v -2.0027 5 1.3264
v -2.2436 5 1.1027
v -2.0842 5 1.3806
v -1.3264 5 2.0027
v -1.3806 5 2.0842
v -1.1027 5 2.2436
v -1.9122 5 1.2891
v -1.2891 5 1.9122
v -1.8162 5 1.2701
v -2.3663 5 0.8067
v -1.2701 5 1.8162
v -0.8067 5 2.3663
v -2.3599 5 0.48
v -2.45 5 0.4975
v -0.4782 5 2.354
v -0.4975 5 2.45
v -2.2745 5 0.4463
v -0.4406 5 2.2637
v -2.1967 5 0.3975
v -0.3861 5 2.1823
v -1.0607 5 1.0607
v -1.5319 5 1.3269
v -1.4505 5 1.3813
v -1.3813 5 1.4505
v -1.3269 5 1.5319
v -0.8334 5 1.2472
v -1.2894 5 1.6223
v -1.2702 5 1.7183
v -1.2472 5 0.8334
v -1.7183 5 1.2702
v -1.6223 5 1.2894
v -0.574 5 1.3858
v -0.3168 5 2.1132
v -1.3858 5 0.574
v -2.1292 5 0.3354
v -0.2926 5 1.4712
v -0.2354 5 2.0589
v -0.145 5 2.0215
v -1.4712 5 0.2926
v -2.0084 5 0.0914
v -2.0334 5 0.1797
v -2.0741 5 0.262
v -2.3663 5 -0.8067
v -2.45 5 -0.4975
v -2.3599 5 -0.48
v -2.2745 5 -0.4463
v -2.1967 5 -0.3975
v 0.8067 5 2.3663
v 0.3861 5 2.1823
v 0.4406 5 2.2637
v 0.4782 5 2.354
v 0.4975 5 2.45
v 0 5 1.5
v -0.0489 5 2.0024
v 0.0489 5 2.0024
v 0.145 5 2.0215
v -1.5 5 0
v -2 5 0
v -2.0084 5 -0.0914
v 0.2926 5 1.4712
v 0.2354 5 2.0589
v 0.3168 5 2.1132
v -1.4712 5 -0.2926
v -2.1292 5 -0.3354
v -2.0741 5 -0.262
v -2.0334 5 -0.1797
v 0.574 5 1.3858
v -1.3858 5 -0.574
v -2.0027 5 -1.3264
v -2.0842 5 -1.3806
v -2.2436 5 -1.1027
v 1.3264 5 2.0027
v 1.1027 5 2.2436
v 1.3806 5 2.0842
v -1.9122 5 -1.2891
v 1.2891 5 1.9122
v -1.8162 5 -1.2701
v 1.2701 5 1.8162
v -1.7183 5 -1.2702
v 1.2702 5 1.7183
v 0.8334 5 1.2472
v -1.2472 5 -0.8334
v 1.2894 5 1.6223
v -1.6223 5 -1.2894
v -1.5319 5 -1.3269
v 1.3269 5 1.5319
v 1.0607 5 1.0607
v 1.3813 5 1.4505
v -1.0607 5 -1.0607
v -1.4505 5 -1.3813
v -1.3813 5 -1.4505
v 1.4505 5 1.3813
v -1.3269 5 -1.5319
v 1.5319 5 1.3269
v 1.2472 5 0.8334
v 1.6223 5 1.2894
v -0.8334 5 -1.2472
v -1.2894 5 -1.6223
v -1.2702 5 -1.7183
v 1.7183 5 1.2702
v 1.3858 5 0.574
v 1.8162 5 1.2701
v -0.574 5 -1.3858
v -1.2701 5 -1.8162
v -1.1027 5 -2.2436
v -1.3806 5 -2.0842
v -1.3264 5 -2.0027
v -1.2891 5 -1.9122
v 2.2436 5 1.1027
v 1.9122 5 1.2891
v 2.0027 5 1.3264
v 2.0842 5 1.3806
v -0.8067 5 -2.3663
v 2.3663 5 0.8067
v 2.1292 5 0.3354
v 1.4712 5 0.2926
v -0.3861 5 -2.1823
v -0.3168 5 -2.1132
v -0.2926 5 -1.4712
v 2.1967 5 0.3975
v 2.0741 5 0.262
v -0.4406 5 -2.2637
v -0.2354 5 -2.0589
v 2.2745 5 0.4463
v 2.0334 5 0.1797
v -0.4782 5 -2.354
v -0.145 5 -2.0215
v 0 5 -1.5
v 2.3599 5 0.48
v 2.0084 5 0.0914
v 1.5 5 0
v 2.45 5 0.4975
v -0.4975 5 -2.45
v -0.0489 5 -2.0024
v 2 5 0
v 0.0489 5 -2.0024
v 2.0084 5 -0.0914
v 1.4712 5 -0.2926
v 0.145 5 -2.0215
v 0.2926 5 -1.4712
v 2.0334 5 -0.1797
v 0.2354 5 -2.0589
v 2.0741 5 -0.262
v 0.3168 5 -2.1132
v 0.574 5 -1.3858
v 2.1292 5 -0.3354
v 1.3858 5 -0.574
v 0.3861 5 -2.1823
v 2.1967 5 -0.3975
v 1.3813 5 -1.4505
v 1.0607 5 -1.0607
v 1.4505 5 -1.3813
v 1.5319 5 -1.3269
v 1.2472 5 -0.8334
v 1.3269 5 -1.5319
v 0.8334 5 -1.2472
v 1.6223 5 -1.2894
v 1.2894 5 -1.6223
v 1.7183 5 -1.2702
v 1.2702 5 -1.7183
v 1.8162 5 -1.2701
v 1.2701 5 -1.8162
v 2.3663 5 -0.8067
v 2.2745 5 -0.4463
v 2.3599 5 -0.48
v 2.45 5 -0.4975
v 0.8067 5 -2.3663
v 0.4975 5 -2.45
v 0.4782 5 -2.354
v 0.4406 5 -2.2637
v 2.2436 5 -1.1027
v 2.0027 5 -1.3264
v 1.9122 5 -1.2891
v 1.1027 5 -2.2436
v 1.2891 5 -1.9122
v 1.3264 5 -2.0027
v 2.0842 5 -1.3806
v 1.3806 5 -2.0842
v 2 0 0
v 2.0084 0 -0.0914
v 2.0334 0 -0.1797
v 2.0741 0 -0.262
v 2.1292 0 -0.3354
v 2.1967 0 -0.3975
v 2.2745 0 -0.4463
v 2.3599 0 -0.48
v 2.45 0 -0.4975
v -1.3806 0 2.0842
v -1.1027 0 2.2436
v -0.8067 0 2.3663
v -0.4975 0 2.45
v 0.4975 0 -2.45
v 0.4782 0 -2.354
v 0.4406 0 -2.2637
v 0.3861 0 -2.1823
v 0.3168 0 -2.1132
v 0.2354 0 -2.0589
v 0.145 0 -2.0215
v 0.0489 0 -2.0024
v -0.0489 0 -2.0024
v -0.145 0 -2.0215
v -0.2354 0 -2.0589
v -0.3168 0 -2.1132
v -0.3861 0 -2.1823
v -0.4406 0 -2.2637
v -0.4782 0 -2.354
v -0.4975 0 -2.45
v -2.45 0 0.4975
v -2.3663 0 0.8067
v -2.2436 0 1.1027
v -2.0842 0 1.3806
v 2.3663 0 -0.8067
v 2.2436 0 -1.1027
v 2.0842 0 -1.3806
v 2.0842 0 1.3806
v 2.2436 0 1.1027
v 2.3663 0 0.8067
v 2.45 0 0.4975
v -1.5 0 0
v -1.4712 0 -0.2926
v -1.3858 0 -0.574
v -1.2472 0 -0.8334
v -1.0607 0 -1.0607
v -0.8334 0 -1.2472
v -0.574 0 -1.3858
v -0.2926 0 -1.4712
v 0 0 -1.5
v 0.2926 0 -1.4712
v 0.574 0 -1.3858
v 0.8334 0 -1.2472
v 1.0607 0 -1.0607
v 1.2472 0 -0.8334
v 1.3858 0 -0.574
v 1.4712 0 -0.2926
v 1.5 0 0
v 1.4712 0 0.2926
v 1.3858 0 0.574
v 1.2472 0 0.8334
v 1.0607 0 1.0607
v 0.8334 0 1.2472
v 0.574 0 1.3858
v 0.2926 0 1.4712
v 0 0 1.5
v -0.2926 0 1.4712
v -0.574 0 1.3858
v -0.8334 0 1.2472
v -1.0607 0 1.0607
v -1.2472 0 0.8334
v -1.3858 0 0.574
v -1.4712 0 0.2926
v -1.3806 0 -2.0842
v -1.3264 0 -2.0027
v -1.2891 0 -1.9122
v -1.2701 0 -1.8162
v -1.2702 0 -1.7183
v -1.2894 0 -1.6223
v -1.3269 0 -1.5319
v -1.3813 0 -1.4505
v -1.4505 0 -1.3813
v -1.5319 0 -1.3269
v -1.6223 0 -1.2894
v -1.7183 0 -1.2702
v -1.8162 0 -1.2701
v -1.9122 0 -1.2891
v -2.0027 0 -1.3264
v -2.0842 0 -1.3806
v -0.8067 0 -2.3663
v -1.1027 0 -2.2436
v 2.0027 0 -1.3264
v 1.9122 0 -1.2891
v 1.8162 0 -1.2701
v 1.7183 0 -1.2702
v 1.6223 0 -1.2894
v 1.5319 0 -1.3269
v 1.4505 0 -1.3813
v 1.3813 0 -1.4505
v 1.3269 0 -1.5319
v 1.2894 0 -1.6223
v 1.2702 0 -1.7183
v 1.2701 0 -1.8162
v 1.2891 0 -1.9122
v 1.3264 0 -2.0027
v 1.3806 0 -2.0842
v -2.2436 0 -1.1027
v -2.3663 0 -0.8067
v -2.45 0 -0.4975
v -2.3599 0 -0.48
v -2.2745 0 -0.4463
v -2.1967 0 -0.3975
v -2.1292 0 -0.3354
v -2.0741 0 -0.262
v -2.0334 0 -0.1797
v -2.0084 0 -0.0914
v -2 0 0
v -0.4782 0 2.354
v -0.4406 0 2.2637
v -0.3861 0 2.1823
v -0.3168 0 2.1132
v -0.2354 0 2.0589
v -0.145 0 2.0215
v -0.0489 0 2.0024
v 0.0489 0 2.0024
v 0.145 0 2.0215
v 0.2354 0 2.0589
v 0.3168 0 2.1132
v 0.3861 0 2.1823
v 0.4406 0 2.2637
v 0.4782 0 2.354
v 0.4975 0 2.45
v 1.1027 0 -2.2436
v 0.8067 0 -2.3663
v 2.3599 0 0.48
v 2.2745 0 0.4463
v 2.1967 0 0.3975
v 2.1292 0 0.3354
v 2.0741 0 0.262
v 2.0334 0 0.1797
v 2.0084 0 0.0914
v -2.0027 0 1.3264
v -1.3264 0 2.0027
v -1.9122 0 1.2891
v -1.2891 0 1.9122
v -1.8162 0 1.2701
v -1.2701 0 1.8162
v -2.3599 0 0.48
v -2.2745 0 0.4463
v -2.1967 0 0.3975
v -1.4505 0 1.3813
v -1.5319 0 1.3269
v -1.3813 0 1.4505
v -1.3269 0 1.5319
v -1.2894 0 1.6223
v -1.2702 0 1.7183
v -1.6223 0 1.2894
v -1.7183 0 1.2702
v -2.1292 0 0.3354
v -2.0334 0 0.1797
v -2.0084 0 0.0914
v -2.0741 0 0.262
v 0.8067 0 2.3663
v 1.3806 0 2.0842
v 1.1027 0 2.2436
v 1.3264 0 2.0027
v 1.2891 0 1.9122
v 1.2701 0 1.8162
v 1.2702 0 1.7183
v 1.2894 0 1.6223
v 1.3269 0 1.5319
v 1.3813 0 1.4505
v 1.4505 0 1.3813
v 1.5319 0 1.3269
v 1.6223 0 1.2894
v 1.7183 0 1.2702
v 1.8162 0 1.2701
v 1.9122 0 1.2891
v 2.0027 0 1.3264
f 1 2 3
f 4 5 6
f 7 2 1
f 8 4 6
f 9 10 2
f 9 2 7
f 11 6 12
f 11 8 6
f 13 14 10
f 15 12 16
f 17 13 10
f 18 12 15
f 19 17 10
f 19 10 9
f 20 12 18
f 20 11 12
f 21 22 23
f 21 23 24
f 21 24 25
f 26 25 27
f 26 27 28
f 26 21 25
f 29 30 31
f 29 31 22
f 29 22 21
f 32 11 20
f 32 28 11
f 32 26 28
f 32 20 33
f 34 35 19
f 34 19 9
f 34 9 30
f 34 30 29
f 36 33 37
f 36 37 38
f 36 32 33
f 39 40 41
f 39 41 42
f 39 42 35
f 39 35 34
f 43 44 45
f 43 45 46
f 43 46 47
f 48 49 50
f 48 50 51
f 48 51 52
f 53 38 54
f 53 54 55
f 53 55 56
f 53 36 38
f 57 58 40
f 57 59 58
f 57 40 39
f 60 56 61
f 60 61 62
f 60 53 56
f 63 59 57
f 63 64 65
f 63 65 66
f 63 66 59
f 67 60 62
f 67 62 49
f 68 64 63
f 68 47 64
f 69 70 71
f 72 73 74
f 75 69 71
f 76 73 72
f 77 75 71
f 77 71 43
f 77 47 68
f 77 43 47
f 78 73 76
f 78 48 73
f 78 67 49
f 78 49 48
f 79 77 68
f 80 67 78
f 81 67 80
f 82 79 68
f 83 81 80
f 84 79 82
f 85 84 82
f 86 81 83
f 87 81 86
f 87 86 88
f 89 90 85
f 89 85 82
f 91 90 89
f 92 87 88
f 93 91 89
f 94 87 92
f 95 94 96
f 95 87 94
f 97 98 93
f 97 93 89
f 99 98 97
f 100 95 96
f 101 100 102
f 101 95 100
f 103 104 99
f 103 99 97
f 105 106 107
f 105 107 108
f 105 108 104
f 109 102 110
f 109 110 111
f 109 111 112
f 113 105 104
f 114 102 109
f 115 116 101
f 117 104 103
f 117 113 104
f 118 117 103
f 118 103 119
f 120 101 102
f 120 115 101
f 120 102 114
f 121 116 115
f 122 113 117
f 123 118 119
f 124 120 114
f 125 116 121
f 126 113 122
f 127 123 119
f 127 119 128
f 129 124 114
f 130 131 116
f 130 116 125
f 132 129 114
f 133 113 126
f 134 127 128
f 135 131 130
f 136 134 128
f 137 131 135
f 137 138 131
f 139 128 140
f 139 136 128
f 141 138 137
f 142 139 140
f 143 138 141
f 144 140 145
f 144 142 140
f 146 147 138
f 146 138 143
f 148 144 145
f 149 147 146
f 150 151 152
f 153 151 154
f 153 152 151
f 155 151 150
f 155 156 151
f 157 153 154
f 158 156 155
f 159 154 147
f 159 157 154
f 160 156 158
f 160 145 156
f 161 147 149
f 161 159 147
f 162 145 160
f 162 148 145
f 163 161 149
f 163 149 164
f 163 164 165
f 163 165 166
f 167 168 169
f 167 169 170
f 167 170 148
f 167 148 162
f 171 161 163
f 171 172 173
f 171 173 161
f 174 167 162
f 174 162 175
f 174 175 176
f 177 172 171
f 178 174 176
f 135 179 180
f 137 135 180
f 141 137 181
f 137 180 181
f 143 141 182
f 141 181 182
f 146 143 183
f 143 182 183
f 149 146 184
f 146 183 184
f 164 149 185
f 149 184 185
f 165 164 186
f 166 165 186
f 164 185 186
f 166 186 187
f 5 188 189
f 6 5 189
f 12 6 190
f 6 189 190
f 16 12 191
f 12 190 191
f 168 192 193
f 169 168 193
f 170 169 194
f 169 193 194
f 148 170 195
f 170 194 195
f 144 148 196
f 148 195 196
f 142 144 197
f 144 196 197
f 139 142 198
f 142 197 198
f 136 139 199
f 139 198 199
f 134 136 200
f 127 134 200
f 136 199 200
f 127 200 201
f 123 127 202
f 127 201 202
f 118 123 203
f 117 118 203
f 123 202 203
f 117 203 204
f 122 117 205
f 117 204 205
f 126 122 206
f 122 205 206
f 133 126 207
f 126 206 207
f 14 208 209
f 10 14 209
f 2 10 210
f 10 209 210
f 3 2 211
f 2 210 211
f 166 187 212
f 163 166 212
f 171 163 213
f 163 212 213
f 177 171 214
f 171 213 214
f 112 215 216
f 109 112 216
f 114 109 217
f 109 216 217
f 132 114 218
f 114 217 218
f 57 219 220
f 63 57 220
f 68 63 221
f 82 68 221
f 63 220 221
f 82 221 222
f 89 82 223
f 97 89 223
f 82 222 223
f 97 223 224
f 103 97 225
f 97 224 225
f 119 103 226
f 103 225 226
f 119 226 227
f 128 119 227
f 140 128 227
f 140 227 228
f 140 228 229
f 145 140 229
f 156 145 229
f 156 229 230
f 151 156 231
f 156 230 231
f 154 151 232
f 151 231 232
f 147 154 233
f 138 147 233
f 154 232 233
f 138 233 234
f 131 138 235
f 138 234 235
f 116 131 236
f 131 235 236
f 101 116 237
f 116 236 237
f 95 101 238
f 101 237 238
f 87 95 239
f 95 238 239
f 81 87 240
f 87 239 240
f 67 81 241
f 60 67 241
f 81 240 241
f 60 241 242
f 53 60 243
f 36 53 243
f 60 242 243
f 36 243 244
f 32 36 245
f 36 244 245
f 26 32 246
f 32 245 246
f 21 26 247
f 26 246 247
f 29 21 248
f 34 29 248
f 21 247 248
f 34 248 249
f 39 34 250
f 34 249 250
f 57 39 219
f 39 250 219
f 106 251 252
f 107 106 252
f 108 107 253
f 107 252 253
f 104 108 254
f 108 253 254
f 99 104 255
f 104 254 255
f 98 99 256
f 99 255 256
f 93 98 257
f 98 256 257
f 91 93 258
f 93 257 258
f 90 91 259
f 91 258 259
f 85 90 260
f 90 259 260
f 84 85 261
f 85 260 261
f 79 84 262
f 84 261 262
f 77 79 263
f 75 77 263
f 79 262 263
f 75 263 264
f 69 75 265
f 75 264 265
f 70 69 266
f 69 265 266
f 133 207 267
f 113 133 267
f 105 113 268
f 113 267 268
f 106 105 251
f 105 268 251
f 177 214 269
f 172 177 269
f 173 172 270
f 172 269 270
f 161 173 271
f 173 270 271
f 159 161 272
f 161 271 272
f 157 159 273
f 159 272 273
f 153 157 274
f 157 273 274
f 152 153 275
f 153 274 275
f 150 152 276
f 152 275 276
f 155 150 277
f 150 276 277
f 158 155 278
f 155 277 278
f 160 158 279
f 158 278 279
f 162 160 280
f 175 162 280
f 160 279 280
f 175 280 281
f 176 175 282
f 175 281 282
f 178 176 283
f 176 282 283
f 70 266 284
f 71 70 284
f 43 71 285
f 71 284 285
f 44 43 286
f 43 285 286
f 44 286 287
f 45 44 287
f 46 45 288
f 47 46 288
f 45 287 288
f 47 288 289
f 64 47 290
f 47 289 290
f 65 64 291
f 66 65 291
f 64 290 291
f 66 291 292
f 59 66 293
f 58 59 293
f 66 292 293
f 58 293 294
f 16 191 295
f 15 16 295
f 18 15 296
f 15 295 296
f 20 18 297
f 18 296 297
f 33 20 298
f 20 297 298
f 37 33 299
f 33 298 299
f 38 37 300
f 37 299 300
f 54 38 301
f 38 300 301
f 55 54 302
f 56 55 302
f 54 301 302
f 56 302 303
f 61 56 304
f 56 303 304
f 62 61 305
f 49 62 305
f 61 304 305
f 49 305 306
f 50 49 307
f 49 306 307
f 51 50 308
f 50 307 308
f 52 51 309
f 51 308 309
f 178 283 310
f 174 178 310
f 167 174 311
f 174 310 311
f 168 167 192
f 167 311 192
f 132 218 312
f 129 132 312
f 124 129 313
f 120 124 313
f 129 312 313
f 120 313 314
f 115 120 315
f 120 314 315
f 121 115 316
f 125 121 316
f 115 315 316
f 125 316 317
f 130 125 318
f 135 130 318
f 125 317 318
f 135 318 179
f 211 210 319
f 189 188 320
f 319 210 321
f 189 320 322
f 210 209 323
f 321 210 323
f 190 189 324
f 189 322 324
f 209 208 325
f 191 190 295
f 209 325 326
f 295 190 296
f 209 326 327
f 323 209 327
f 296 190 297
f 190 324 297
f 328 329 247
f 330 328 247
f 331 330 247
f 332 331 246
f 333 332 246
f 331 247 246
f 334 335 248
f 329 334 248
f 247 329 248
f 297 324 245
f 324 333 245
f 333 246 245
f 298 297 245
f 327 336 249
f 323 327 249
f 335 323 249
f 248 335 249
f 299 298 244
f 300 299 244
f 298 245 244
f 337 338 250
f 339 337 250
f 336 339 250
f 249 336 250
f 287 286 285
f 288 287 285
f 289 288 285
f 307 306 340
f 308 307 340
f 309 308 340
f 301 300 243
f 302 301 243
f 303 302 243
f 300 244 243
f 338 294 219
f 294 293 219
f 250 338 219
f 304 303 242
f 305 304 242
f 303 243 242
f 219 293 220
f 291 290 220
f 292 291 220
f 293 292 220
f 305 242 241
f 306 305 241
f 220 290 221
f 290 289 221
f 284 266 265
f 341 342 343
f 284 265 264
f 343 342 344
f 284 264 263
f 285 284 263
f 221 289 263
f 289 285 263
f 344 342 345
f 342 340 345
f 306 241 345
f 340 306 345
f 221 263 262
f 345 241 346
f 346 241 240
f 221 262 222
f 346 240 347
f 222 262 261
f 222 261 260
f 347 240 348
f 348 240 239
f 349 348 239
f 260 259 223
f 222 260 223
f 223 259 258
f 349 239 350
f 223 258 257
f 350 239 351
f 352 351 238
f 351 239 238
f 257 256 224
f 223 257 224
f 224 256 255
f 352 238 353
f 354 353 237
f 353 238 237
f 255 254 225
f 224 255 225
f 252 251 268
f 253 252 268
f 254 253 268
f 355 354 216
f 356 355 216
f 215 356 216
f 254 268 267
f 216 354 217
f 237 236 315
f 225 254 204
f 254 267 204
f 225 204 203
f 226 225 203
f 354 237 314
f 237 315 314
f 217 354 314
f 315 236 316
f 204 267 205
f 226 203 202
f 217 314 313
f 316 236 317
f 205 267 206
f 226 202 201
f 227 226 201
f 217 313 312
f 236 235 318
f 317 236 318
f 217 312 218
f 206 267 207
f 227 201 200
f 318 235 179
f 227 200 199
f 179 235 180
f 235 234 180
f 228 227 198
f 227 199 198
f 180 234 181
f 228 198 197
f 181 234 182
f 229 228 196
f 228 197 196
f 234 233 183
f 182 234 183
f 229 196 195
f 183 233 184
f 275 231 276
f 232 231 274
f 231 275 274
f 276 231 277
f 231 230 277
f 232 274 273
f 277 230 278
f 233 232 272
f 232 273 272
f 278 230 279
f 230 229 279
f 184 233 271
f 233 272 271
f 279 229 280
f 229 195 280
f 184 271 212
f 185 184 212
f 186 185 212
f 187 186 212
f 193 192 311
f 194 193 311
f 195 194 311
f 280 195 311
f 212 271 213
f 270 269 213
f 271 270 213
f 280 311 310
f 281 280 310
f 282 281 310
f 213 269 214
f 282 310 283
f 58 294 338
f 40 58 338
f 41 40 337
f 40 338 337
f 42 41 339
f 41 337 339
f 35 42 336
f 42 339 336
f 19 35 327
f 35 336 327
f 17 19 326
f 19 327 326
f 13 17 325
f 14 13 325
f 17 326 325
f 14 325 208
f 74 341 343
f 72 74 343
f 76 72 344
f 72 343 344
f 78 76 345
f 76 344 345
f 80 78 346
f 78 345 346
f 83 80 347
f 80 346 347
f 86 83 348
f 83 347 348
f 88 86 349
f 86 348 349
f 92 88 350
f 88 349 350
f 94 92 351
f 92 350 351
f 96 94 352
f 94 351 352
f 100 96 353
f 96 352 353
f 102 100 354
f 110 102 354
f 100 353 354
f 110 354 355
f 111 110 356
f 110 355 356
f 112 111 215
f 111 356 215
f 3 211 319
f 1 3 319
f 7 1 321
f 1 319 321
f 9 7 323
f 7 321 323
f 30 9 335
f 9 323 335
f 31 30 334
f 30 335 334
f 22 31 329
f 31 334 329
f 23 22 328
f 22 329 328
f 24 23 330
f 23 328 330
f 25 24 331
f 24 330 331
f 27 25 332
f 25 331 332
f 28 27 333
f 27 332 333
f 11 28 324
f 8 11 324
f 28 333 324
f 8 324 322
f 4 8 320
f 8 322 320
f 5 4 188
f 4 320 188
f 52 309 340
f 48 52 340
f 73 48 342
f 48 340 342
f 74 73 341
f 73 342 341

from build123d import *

# Parameters (mm, degrees)
BOSS_EXTRUDE1_DEPTH = 5


with BuildPart() as part:
    # Sketch1 → Boss-Extrude1 (new body)
    with BuildSketch(Plane(origin=(0, 0, 0), x_dir=(1, 0, 0), z_dir=(0, 1, 0))):
        with BuildLine():
            Line((-1.5, 0), (-2, 0))
            ThreePointArc((-2, 0), (-2.129190076, -0.335410197), (-2.45, -0.497493719))
            ThreePointArc((-2.45, -0.497493719), (-2.309698831, -0.956708581), (-2.084192796, -1.380630432))
            ThreePointArc((-2.084192796, -1.380630432), (-1.414213562, -1.414213562), (-1.380630432, -2.084192796))
            ThreePointArc((-1.380630432, -2.084192796), (-0.956708581, -2.309698831), (-0.497493719, -2.45))
            ThreePointArc((-0.497493719, -2.45), (0, -2), (0.497493719, -2.45))
            ThreePointArc((0.497493719, -2.45), (0.956708581, -2.309698831), (1.380630432, -2.084192796))
            ThreePointArc((1.380630432, -2.084192796), (1.414213562, -1.414213562), (2.084192796, -1.380630432))
            ThreePointArc((2.084192796, -1.380630432), (2.309698831, -0.956708581), (2.45, -0.497493719))
            ThreePointArc((2.45, -0.497493719), (2.129190076, -0.335410197), (2, 0))
            Line((2, 0), (1.5, 0))
            ThreePointArc((1.5, 0), (0, -1.5), (-1.5, 0))
        make_face()
        with BuildLine():
            ThreePointArc((-2.45, 0.497493719), (-2.129190076, 0.335410197), (-2, 0))
            Line((-2, 0), (-1.5, 0))
            ThreePointArc((-1.5, 0), (0, 1.5), (1.5, 0))
            Line((1.5, 0), (2, 0))
            ThreePointArc((2, 0), (2.129190076, 0.335410197), (2.45, 0.497493719))
            ThreePointArc((2.45, 0.497493719), (2.309698831, 0.956708581), (2.084192796, 1.380630432))
            ThreePointArc((2.084192796, 1.380630432), (1.414213562, 1.414213562), (1.380630432, 2.084192796))
            ThreePointArc((1.380630432, 2.084192796), (0.956708581, 2.309698831), (0.497493719, 2.45))
            ThreePointArc((0.497493719, 2.45), (0, 2), (-0.497493719, 2.45))
            ThreePointArc((-0.497493719, 2.45), (-0.956708581, 2.309698831), (-1.380630432, 2.084192796))
            ThreePointArc((-1.380630432, 2.084192796), (-1.414213562, 1.414213562), (-2.084192796, 1.380630432))
            ThreePointArc((-2.084192796, 1.380630432), (-2.309698831, 0.956708581), (-2.45, 0.497493719))
        make_face()
    extrude(amount=BOSS_EXTRUDE1_DEPTH)


solid = part.part
